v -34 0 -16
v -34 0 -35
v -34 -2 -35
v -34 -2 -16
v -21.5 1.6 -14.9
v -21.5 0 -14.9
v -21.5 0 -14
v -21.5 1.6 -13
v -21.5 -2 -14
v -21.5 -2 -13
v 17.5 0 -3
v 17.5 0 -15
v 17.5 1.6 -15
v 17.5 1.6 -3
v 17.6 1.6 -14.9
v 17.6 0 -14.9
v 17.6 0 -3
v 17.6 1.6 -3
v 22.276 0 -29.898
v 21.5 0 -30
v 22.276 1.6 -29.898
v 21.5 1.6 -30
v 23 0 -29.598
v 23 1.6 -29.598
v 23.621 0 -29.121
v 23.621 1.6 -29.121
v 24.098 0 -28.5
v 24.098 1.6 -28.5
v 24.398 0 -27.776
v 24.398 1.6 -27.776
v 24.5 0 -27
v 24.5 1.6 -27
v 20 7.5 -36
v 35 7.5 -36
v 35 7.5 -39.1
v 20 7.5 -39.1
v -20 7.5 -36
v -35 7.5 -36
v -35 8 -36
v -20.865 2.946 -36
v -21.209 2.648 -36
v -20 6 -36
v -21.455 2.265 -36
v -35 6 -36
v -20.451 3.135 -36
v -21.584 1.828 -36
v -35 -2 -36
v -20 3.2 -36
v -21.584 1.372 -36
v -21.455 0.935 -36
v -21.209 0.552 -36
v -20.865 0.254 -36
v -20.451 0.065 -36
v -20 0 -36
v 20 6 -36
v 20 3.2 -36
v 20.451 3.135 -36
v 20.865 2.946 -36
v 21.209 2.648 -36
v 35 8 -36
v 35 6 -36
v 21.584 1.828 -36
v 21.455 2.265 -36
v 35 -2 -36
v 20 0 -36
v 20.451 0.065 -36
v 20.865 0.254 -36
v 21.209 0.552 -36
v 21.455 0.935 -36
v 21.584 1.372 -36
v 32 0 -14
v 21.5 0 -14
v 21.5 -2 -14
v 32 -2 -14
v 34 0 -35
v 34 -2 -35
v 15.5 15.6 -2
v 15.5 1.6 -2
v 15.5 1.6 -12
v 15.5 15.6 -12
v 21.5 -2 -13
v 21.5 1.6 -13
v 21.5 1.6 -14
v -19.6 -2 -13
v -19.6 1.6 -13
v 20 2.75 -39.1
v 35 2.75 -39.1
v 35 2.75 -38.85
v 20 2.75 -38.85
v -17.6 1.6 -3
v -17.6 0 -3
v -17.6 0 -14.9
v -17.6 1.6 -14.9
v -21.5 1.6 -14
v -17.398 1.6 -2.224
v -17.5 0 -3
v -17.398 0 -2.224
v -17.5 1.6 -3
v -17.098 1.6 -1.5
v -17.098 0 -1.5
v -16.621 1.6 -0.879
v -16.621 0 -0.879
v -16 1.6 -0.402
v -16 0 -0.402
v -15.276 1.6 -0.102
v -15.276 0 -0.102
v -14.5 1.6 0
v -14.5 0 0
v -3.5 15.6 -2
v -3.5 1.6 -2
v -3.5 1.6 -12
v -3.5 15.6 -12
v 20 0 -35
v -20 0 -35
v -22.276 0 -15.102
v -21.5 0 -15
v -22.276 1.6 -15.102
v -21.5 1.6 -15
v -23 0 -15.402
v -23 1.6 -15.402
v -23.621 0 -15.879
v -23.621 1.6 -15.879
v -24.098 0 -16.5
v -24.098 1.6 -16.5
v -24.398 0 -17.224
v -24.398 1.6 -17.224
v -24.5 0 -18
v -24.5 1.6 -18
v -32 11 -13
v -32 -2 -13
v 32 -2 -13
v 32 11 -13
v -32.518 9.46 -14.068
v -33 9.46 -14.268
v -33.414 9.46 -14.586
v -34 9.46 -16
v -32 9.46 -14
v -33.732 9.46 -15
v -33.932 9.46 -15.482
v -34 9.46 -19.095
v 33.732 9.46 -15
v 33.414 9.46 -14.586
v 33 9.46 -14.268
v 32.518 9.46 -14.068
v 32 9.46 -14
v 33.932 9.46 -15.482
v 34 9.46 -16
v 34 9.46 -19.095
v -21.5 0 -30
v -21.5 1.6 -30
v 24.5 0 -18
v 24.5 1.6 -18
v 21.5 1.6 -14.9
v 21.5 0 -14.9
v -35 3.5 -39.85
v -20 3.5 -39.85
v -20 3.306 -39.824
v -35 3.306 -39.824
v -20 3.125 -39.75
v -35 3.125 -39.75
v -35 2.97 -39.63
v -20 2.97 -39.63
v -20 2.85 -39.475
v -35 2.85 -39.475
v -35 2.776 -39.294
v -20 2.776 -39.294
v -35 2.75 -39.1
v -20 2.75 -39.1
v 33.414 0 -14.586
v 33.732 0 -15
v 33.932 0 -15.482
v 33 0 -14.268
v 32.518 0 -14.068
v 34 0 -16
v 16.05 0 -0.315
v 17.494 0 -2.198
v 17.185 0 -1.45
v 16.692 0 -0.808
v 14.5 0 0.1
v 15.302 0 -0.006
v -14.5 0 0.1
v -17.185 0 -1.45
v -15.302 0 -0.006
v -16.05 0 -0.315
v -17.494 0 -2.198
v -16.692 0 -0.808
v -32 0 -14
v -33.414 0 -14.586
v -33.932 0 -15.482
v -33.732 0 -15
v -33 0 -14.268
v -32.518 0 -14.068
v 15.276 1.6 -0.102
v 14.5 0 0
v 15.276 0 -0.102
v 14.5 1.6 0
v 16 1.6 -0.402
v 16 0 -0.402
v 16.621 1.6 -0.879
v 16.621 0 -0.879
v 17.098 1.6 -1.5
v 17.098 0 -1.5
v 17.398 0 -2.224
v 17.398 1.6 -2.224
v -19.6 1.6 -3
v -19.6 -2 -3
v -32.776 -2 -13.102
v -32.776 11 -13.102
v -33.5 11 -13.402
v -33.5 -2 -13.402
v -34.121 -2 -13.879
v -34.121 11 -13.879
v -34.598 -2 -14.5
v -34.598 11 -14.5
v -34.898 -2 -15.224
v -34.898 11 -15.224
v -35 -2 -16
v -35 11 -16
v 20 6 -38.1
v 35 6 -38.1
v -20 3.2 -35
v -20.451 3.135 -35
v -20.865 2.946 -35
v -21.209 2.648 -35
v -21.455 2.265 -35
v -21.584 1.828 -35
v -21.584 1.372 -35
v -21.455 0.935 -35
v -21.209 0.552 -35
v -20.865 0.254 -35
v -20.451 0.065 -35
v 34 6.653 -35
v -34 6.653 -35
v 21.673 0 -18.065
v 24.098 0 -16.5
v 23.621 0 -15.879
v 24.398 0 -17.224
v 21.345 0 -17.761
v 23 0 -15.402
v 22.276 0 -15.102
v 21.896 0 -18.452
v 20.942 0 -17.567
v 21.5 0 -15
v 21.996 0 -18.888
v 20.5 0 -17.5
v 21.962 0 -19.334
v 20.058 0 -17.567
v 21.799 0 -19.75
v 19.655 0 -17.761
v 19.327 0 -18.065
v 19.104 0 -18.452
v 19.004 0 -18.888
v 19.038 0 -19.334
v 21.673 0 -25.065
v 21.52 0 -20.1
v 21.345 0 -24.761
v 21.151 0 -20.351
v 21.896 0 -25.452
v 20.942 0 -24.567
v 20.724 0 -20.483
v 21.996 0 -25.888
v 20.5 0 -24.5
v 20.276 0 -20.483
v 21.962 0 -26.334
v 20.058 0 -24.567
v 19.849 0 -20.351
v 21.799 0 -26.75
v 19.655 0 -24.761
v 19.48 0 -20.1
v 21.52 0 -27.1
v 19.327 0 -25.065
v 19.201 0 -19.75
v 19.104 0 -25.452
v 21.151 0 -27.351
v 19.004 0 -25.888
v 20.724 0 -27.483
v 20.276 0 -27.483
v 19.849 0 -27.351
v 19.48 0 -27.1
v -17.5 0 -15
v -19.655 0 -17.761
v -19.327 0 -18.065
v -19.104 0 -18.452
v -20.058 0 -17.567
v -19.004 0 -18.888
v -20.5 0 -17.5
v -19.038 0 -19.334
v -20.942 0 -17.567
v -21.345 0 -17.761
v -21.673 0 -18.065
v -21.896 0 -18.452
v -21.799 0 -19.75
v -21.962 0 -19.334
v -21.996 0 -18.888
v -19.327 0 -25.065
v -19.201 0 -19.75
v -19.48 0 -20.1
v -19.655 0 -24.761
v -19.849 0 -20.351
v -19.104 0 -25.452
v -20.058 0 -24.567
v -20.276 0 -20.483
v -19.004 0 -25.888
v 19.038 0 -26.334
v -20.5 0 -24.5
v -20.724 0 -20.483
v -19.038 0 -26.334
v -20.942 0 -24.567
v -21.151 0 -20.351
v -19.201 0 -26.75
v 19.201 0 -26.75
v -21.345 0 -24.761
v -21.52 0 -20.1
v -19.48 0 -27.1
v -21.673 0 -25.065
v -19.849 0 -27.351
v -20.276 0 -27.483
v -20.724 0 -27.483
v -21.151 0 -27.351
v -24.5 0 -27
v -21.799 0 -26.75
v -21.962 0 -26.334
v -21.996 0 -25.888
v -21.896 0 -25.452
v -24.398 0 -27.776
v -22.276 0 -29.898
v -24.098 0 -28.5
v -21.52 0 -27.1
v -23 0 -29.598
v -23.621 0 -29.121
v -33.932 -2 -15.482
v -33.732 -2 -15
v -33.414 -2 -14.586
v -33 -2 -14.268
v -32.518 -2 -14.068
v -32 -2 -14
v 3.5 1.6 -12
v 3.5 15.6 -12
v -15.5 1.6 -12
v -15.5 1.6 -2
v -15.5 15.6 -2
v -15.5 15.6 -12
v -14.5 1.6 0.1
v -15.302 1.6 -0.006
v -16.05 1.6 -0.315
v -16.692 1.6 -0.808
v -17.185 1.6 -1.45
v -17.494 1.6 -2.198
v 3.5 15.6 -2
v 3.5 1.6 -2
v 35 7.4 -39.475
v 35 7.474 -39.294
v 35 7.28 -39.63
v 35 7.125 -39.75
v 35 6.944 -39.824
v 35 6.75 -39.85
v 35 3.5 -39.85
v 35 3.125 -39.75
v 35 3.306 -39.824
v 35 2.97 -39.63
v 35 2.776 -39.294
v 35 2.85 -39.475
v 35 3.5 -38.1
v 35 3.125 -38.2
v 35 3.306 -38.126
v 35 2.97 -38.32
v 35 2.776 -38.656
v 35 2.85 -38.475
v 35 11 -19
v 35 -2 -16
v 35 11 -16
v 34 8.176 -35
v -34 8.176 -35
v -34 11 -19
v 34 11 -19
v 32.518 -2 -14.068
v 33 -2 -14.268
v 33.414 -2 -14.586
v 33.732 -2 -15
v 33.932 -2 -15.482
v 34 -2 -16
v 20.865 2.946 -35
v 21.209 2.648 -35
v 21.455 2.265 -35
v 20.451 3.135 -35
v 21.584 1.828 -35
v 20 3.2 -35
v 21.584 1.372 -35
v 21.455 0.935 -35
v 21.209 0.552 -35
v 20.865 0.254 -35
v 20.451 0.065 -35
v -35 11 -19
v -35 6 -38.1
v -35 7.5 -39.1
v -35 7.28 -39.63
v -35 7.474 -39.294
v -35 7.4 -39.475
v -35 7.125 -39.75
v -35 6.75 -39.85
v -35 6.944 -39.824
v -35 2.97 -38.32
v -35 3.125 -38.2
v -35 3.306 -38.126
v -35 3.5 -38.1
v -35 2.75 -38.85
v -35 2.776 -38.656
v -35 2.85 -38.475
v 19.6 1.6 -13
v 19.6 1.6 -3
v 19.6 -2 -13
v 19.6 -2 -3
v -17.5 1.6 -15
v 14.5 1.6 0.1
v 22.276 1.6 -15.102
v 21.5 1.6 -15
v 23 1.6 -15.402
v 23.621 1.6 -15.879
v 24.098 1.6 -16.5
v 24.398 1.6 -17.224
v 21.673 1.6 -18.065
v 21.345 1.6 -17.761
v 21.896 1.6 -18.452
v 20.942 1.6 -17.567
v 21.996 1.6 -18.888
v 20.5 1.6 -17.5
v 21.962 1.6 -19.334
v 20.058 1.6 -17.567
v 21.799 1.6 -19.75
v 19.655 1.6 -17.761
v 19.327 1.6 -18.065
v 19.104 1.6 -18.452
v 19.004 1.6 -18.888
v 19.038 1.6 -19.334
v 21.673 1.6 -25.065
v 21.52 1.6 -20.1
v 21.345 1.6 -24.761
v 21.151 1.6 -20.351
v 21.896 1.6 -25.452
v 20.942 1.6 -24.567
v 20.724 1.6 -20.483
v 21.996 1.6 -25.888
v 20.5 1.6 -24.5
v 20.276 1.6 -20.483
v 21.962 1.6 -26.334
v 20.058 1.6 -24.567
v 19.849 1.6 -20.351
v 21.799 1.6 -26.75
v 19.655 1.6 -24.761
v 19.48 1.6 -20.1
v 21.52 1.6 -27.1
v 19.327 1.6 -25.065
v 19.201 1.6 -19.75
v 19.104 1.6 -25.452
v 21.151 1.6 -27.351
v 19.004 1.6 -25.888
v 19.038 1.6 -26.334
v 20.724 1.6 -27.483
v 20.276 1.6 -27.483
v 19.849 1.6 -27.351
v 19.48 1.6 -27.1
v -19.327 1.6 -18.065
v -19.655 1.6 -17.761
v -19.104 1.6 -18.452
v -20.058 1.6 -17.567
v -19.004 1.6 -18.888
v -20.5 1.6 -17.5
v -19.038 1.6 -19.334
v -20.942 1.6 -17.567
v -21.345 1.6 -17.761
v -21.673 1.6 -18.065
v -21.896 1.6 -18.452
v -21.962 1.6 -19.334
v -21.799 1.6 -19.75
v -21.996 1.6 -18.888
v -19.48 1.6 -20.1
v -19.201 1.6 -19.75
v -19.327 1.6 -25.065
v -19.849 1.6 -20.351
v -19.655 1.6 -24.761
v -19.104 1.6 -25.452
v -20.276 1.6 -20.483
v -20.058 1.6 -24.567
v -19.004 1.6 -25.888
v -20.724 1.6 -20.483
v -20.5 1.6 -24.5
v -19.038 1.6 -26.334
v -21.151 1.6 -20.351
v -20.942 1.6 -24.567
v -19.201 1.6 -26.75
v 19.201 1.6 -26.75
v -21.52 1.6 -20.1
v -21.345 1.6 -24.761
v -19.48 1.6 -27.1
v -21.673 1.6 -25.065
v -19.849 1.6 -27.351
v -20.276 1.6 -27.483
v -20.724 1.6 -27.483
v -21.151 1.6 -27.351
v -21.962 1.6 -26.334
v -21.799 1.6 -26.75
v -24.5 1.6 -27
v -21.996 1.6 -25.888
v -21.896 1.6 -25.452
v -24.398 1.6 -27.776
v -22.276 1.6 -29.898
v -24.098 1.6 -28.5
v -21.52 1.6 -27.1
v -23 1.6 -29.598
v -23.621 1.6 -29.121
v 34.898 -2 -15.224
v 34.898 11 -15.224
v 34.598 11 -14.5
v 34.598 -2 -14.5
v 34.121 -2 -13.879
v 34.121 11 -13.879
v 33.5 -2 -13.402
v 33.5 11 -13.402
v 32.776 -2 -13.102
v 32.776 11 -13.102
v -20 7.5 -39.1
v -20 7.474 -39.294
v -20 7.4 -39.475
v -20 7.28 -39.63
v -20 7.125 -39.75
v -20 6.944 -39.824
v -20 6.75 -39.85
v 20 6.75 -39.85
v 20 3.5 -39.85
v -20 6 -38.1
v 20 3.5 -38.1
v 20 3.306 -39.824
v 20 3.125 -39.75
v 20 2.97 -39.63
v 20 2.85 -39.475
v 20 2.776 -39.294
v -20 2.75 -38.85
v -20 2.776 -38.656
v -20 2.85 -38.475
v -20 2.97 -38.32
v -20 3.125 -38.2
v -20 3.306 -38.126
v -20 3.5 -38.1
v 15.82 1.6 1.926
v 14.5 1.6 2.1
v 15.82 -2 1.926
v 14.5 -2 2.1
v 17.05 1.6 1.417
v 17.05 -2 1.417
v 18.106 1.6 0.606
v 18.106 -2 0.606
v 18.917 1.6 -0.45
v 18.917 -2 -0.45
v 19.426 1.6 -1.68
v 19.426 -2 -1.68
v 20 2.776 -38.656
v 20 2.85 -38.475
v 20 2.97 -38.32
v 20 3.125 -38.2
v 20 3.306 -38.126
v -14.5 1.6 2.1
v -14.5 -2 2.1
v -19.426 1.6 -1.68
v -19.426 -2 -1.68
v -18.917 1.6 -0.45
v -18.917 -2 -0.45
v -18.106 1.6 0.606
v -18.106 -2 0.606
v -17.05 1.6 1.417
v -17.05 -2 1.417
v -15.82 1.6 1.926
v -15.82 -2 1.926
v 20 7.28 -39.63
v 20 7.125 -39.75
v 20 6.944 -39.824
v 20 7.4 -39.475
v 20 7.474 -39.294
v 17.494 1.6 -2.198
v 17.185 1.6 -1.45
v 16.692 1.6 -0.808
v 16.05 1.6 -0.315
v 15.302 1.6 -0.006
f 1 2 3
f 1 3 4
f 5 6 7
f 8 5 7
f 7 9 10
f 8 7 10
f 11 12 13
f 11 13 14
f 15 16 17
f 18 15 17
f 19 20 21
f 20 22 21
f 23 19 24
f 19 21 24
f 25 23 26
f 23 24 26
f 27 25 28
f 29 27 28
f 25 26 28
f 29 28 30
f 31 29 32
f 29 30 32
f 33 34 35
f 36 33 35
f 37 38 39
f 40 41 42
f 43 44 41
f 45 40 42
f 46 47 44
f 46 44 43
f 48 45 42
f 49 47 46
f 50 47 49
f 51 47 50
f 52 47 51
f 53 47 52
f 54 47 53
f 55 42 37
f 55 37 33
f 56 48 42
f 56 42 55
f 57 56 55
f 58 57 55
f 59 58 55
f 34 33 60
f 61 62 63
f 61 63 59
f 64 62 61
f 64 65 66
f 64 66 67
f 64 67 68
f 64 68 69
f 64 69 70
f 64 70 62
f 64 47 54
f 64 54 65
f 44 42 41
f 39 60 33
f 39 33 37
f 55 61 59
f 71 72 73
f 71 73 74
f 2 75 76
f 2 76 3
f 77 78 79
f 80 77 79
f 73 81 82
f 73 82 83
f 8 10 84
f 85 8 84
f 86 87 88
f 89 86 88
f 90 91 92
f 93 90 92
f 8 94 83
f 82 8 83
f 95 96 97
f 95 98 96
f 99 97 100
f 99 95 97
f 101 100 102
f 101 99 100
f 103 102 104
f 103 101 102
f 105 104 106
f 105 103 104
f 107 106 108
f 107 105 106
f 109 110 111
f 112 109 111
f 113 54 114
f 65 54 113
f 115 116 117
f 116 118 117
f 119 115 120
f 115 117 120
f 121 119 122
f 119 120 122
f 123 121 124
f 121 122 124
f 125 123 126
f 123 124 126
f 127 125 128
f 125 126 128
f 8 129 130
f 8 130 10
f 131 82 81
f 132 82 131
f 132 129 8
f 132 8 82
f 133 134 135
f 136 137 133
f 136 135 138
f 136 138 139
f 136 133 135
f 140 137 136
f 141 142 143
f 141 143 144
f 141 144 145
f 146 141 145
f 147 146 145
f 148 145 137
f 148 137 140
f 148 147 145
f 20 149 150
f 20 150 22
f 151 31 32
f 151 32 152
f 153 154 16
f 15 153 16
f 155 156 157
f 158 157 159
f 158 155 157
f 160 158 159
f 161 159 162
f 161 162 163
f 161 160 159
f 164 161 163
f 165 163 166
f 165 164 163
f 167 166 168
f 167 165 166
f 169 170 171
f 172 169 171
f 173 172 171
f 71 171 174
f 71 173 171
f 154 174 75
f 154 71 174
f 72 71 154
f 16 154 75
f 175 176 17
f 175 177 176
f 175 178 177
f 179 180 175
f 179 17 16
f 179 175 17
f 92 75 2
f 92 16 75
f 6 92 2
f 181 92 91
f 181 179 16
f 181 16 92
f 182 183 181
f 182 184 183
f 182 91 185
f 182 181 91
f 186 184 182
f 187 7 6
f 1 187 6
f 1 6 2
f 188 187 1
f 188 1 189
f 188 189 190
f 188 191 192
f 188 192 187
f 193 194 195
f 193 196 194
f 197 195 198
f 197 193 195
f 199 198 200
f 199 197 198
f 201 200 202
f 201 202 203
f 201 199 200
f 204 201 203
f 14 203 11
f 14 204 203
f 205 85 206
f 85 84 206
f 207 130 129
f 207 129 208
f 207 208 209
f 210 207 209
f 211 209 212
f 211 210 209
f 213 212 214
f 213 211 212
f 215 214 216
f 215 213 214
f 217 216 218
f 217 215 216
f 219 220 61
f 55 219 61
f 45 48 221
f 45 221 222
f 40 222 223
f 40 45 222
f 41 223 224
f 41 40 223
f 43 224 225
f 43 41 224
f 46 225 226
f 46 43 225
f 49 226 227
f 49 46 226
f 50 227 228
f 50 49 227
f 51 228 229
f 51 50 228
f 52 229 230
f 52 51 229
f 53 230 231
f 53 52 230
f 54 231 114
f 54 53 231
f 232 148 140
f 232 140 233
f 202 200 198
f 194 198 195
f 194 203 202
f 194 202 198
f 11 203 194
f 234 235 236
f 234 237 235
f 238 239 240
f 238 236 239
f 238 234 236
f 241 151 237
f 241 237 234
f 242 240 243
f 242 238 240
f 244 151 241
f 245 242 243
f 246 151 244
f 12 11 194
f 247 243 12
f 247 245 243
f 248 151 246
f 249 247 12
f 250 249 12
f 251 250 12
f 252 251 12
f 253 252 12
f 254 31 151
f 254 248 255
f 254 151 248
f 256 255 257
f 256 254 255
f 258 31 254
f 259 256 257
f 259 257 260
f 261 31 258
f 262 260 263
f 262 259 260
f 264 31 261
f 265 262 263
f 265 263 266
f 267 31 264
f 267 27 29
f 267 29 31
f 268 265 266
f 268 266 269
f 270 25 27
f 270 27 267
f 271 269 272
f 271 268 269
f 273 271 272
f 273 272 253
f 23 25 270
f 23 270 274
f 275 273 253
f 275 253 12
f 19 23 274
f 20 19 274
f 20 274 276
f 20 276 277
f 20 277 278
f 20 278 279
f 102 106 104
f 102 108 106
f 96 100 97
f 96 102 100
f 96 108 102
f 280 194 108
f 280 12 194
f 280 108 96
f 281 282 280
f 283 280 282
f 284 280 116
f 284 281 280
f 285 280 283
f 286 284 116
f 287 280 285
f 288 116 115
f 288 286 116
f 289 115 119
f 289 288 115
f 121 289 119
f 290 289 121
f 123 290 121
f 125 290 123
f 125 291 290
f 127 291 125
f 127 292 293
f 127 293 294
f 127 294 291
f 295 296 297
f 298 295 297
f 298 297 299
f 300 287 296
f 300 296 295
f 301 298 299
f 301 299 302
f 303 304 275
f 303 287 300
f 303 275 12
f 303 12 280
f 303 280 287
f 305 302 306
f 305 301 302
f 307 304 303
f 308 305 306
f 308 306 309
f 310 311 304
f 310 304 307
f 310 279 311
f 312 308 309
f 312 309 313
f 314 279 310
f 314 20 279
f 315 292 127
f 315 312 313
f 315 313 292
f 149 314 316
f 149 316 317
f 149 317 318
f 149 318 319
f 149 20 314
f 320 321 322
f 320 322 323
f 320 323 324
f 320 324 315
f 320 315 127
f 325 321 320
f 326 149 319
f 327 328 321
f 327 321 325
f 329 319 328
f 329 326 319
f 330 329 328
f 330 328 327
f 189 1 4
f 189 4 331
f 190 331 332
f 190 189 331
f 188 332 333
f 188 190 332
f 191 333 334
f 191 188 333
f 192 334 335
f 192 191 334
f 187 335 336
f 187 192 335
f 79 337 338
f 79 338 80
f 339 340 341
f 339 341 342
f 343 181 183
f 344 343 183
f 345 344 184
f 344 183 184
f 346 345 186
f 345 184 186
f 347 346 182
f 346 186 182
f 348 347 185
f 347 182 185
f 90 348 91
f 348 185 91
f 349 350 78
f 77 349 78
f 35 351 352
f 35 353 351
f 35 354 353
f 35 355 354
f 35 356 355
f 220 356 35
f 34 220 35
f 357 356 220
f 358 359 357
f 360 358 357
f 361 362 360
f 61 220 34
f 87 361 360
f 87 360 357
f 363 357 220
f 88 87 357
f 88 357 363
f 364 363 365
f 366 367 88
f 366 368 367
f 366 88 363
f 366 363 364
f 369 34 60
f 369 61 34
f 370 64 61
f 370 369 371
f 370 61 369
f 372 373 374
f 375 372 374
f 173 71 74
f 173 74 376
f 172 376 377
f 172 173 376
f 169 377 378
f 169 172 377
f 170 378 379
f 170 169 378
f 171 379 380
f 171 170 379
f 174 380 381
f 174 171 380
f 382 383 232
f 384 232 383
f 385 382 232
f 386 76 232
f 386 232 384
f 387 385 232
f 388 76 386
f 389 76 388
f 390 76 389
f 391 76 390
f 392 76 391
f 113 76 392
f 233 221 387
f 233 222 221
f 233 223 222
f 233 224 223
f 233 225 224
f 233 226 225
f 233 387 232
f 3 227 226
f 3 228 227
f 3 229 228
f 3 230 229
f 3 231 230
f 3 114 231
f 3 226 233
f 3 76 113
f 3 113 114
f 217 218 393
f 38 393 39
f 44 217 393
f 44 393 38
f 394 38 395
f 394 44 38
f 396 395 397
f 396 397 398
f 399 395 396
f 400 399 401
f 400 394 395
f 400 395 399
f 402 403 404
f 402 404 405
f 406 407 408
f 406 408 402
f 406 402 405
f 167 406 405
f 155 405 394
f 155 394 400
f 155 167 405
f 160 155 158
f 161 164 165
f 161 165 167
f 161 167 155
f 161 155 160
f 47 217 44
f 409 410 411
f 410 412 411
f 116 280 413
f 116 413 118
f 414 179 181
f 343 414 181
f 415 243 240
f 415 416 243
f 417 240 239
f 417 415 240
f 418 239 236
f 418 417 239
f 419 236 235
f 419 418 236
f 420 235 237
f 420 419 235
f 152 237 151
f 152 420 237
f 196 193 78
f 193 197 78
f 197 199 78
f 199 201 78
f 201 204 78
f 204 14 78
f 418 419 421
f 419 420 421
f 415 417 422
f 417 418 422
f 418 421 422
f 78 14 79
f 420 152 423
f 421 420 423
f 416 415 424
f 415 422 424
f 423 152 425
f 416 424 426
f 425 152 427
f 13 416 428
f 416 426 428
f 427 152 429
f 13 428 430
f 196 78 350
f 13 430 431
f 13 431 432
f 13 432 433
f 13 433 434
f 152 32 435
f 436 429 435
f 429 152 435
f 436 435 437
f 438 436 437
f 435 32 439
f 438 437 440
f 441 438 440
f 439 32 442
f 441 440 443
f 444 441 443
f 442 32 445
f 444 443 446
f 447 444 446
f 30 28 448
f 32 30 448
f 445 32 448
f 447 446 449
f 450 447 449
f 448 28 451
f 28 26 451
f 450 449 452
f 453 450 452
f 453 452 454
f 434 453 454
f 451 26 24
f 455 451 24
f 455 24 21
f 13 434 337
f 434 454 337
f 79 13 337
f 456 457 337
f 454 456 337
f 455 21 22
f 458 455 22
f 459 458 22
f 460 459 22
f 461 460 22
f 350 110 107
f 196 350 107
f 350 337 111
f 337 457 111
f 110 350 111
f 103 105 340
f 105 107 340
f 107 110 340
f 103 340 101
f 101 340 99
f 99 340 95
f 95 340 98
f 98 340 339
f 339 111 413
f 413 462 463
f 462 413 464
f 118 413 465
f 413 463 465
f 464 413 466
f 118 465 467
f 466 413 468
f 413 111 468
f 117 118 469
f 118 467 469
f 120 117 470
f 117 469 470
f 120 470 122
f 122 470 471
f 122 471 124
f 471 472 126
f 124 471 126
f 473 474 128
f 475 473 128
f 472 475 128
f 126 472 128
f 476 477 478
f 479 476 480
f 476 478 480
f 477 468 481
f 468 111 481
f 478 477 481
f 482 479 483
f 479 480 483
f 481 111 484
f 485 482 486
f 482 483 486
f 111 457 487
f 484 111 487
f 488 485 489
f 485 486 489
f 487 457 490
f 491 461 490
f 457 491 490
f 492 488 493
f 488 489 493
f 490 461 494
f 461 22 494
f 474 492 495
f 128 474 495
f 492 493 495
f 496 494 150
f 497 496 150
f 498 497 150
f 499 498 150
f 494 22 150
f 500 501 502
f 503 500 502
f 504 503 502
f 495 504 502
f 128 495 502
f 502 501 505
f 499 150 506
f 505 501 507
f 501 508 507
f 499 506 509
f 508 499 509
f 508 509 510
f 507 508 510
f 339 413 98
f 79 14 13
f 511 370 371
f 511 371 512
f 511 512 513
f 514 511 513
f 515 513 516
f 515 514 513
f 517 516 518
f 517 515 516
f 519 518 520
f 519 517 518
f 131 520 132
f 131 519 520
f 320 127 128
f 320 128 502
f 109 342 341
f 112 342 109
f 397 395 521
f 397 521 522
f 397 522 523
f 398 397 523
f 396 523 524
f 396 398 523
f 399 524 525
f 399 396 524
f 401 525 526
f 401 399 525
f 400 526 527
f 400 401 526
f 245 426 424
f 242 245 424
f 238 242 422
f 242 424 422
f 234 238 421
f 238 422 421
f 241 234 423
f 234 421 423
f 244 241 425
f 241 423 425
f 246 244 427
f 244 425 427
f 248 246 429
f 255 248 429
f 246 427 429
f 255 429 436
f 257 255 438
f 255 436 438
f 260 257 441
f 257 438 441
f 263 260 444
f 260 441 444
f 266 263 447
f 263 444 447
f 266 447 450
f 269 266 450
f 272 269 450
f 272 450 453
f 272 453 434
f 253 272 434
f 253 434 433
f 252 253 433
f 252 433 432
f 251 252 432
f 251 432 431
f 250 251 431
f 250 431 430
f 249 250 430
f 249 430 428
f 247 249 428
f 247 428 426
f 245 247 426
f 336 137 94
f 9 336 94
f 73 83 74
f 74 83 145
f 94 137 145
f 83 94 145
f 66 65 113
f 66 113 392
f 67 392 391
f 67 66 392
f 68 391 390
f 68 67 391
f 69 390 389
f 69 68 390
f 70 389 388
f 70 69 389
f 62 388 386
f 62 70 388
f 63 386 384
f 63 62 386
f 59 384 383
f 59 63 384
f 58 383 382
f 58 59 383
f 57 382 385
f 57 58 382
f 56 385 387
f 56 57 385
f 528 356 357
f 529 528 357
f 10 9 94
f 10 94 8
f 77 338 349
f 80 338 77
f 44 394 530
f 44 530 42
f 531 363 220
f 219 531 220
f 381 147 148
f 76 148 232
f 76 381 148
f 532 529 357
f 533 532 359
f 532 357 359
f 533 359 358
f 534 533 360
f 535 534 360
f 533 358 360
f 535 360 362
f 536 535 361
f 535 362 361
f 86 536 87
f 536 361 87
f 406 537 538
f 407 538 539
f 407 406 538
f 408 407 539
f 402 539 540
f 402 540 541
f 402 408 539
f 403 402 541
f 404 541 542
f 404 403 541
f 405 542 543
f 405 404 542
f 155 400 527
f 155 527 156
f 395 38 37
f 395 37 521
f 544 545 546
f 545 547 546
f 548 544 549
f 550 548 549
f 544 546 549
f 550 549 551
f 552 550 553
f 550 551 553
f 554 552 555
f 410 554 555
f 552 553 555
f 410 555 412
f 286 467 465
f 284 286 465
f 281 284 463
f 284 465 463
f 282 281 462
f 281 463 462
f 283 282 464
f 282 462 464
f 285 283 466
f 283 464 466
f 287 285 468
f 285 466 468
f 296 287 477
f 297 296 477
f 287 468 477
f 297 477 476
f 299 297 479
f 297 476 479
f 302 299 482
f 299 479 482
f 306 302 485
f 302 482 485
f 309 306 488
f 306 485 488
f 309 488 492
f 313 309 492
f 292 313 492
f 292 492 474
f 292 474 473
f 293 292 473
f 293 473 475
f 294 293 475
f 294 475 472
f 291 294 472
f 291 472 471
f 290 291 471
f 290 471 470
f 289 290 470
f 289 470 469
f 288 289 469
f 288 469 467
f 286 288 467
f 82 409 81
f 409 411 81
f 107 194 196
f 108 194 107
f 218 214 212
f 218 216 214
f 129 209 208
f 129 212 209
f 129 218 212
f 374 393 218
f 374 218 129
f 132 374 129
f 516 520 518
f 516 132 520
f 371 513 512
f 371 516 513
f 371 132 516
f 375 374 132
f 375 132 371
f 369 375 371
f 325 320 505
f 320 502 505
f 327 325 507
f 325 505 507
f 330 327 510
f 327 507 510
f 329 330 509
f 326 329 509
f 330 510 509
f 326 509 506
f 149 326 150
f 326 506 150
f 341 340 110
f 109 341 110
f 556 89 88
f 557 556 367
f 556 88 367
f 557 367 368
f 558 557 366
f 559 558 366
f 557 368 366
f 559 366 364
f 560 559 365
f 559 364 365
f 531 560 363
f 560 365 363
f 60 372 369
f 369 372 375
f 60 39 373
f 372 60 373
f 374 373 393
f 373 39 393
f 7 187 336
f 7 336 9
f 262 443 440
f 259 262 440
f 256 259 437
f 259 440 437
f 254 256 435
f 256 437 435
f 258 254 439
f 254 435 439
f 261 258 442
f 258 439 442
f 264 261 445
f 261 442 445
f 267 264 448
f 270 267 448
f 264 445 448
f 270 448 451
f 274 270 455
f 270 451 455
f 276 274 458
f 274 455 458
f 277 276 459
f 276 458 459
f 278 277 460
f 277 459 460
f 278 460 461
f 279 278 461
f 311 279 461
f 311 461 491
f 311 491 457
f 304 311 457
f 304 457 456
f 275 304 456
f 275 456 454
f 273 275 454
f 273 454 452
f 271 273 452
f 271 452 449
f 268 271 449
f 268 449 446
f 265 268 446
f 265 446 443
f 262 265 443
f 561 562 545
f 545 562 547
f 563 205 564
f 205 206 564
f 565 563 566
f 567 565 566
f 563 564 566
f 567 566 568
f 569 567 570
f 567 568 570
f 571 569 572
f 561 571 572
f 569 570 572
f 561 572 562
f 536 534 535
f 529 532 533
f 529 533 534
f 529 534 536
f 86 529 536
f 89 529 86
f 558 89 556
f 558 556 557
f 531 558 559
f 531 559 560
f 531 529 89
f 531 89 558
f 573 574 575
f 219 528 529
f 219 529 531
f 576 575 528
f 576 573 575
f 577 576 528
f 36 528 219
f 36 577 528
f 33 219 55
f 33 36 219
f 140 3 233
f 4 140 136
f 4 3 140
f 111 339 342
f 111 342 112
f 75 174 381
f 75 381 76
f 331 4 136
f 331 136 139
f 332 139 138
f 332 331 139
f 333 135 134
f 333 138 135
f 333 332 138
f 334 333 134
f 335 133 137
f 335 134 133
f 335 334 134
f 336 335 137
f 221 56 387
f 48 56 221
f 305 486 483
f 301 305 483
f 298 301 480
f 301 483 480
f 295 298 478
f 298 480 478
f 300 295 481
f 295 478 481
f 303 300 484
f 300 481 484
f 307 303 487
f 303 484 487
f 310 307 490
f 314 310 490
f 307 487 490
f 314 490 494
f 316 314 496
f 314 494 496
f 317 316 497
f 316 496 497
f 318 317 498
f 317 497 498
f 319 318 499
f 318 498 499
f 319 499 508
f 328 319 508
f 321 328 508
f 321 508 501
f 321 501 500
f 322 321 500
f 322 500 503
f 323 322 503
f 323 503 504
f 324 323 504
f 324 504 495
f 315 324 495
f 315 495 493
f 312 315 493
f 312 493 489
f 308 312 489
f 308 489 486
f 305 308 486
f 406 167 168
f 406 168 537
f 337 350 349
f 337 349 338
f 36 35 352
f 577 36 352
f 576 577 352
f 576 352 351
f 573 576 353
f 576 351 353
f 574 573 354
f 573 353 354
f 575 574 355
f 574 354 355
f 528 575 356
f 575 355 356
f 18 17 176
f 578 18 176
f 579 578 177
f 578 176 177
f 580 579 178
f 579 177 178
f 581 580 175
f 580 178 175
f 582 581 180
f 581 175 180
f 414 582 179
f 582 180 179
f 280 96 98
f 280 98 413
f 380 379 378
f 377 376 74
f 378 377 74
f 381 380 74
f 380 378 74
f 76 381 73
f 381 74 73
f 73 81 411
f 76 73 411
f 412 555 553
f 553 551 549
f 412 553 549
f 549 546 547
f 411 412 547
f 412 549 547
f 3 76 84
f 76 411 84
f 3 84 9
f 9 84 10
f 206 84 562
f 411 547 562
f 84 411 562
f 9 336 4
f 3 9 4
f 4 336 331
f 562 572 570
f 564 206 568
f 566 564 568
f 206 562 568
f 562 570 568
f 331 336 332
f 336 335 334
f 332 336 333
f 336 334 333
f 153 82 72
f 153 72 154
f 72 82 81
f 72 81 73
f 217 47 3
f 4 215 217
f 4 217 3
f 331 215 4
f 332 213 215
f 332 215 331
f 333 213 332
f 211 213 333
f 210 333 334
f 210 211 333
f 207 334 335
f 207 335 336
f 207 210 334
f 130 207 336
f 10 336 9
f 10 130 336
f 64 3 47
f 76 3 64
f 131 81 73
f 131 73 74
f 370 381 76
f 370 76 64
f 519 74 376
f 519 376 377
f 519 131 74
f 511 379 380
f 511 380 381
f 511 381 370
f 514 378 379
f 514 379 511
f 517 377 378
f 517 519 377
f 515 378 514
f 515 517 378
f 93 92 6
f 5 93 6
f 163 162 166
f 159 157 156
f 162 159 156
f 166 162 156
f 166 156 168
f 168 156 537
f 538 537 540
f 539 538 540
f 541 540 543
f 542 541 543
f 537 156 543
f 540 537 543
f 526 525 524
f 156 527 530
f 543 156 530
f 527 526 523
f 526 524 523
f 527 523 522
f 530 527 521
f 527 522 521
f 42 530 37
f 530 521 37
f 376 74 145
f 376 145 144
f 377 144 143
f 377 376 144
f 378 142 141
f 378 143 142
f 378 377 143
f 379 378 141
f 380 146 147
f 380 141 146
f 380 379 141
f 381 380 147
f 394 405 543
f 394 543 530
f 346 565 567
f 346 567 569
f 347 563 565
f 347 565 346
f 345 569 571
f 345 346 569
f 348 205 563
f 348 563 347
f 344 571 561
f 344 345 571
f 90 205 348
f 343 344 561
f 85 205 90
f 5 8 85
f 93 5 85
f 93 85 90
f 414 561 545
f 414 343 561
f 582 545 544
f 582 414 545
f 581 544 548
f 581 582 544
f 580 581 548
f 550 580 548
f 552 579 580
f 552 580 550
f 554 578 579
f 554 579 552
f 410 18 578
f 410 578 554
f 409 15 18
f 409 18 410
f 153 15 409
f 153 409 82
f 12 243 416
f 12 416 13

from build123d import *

# Parameters (mm, degrees)
BOSS_EXTRUDE1_DEPTH             = 1.6
SKETCH2_R                       = 1.5
CUT_EXTRUDE1_DEPTH              = 39.766093432
FILLET1_R                       = 3
SKETCH3_W                       = 12
SKETCH3_H                       = 10
BOSS_EXTRUDE2_DEPTH             = 14
BOSS_EXTRUDE3_DEPTH             = 2
BOSS_EXTRUDE4_DEPTH             = 1.6
CUT_EXTRUDE2_DEPTH              = 52.897591466
BOSS_EXTRUDE5_DEPTH             = 15
CUT_EXTRUDE3_DEPTH              = 53.577181362
CUT_EXTRUDE3_DEPTH_BACK         = 53.577181362
BOSS_EXTRUDE6_REACH             = 54.577
BOSS_EXTRUDE6_DIRECTION_2_REACH = 54.577
SKETCH10_W                      = 43
SKETCH10_H                      = 1
BOSS_EXTRUDE7_DEPTH             = 9.4
CUT_EXTRUDE4_DEPTH              = 1
BOSS_EXTRUDE8_DEPTH             = 15


with BuildPart() as part:
    # Sketch1 → Boss-Extrude1 (new body)
    with BuildSketch(Plane(origin=(0, 0, 0), x_dir=(1, 0, 0), z_dir=(0, 1, 0))):
        Polygon((-17.5, 0), (-17.5, 15), (-24.5, 15), (-24.5, 30), (24.5, 30), (24.5, 15), (17.5, 15), (17.5, 0), align=None)
    extrude(amount=BOSS_EXTRUDE1_DEPTH)

    # Sketch2 → Cut-Extrude1 (cut, through all)
    with BuildSketch(Plane(origin=(0, 1.6, 0), x_dir=(1, 0, 0), z_dir=(0, 1, 0))):
        with Locations(Location((-20.5, 26, 0), (0, 0, 270))):
            Circle(SKETCH2_R)
        with Locations(Location((-20.5, 19, 0), (0, 0, 270))):
            Circle(SKETCH2_R)
        with Locations(Location((20.5, 26, 0), (0, 0, 270))):
            Circle(SKETCH2_R)
        with Locations(Location((20.5, 19, 0), (0, 0, 270))):
            Circle(SKETCH2_R)
    extrude(amount=-CUT_EXTRUDE1_DEPTH, mode=Mode.SUBTRACT)

    # Fillet1
    fillet1_edges = [part.edges().sort_by_distance(p)[0] for p in [
        (-17.5, 0.8, 0),
        (-24.5, 0.8, -15),
        (-24.5, 0.8, -30),
        (24.5, 0.8, -30),
        (24.5, 0.8, -15),
        (17.5, 0.8, 0),
    ]]
    fillet(fillet1_edges, radius=FILLET1_R)

    # Sketch3 → Boss-Extrude2 (add)
    with BuildSketch(Plane(origin=(0, 1.6, 0), x_dir=(1, 0, 0), z_dir=(0, 1, 0))):
        with Locations((-9.5, 7)):
            Rectangle(SKETCH3_W, SKETCH3_H)
        with Locations((9.5, 7)):
            Rectangle(SKETCH3_W, SKETCH3_H)
    extrude(amount=BOSS_EXTRUDE2_DEPTH)


with BuildPart() as body_2:
    # Sketch4 → Boss-Extrude3 (new body)
    with BuildSketch(Plane.XZ):
        with BuildLine():
            Line((-32, -13), (-19.6, -13))
            Line((-19.6, -13), (-19.6, -3))
            ThreePointArc((-19.6, -3), (-18.106244584, 0.606244584), (-14.5, 2.1))
            Line((-14.5, 2.1), (14.5, 2.1))
            ThreePointArc((14.5, 2.1), (18.106244584, 0.606244584), (19.6, -3))
            Line((19.6, -3), (19.6, -13))
            Line((19.6, -13), (32, -13))
            ThreePointArc((32, -13), (34.121320344, -13.878679656), (35, -16))
            Line((35, -16), (35, -35))
            Line((35, -35), (-35, -35))
            Line((-35, -35), (-35, -16))
            ThreePointArc((-35, -16), (-34.121320344, -13.878679656), (-32, -13))
        make_face()
    extrude(amount=BOSS_EXTRUDE3_DEPTH)

    # Sketch6 → Cut-Extrude2 (cut, through all)
    with BuildSketch(Plane(origin=(0, 0, 0), x_dir=(1, 0, 0), z_dir=(0, 1, 0))):
        with BuildLine():
            Line((-35, 16), (-35, 35))
            Line((-35, 35), (-34, 35))
            Line((-34, 35), (-34, 16))
            ThreePointArc((-34, 16), (-33.414213562, 14.585786438), (-32, 14))
            Line((-32, 14), (-21.5, 14))
            Line((-21.5, 14), (-21.5, 13))
            Line((-21.5, 13), (-32, 13))
            ThreePointArc((-32, 13), (-34.121320344, 13.878679656), (-35, 16))
        make_face()
        with BuildLine():
            Line((32, 13), (21.5, 13))
            Line((21.5, 13), (21.5, 14))
            Line((21.5, 14), (32, 14))
            ThreePointArc((32, 14), (33.414213562, 14.585786438), (34, 16))
            Line((34, 16), (34, 35))
            Line((34, 35), (35, 35))
            Line((35, 35), (35, 16))
            ThreePointArc((35, 16), (34.121320344, 13.878679656), (32, 13))
        make_face()
    extrude(amount=-CUT_EXTRUDE2_DEPTH, mode=Mode.SUBTRACT)


with BuildPart() as body_3:
    # Sketch5 → Boss-Extrude4 (new body)
    with BuildSketch(Plane(origin=(0, 0, 0), x_dir=(1, 0, 0), z_dir=(0, 1, 0))):
        with BuildLine():
            Line((-21.5, 13), (-19.6, 13))
            Line((-19.6, 13), (-19.6, 3))
            ThreePointArc((-19.6, 3), (-18.106244584, -0.606244584), (-14.5, -2.1))
            Line((-14.5, -2.1), (14.5, -2.1))
            ThreePointArc((14.5, -2.1), (18.106244584, -0.606244584), (19.6, 3))
            Line((19.6, 3), (19.6, 13))
            Line((19.6, 13), (21.5, 13))
            Line((21.5, 13), (21.5, 14.9))
            Line((21.5, 14.9), (17.6, 14.9))
            Line((17.6, 14.9), (17.6, 3))
            ThreePointArc((17.6, 3), (16.692031022, 0.807968978), (14.5, -0.1))
            Line((14.5, -0.1), (-14.5, -0.1))
            ThreePointArc((-14.5, -0.1), (-16.692031022, 0.807968978), (-17.6, 3))
            Line((-17.6, 3), (-17.6, 14.9))
            Line((-17.6, 14.9), (-21.5, 14.9))
            Line((-21.5, 14.9), (-21.5, 13))
        make_face()
    extrude(amount=BOSS_EXTRUDE4_DEPTH)


with BuildPart() as body_4:
    # Sketch7 → Boss-Extrude5 (new body)
    with BuildSketch(Plane.XZ.offset(2)):
        with BuildLine():
            Line((-21.5, -13), (-32, -13))
            ThreePointArc((-32, -13), (-34.121320344, -13.878679656), (-35, -16))
            Line((-35, -16), (-35, -36))
            Line((-35, -36), (35, -36))
            Line((35, -36), (35, -16))
            ThreePointArc((35, -16), (34.121320344, -13.878679656), (32, -13))
            Line((32, -13), (21.5, -13))
            Line((21.5, -13), (21.5, -14))
            Line((21.5, -14), (32, -14))
            ThreePointArc((32, -14), (33.414213562, -14.585786438), (34, -16))
            Line((34, -16), (34, -35))
            Line((34, -35), (-34, -35))
            Line((-34, -35), (-34, -16))
            ThreePointArc((-34, -16), (-33.414213562, -14.585786438), (-32, -14))
            Line((-32, -14), (-21.5, -14))
            Line((-21.5, -14), (-21.5, -13))
        make_face()
    extrude(amount=-BOSS_EXTRUDE5_DEPTH)

    # Sketch8 → Cut-Extrude3 (cut, two sides: drawn at the far end of the back side and taken through both)
    with BuildSketch(Plane(origin=(0, 0, 0), x_dir=(0, 0, -1), z_dir=(1, 0, 0)).offset(-CUT_EXTRUDE3_DEPTH_BACK)):
        Polygon((36, 8), (19, 11), (13, 11), (13, 13), (36, 13), align=None)
    extrude(amount=CUT_EXTRUDE3_DEPTH + CUT_EXTRUDE3_DEPTH_BACK, mode=Mode.SUBTRACT)

    # Sketch9 → Boss-Extrude6 (add, up to next)
    with BuildSketch(Plane(origin=(0, 0, 0), x_dir=(0, 0, -1), z_dir=(1, 0, 0)), mode=Mode.PRIVATE) as boss_extrude6_sk1:
        Polygon((35, 8.176470588), (19, 11), (14, 11), (14, 9.46), (19.095328416, 9.46), (35, 6.65329325), align=None)
    boss_extrude6_tool1 = extrude(boss_extrude6_sk1.sketch, amount=BOSS_EXTRUDE6_REACH, mode=Mode.PRIVATE) - body_4.part
    add(boss_extrude6_tool1.solids().sort_by_distance((0, 9.16359, -24.478882))[0])

    # Sketch9 → Boss-Extrude6 direction 2 (add, up to next)
    with BuildSketch(Plane(origin=(0, 0, 0), x_dir=(0, 0, -1), z_dir=(1, 0, 0)), mode=Mode.PRIVATE) as boss_extrude6_direction_2_sk1:
        Polygon((35, 8.176470588), (19, 11), (14, 11), (14, 9.46), (19.095328416, 9.46), (35, 6.65329325), align=None)
    boss_extrude6_direction_2_tool1 = extrude(boss_extrude6_direction_2_sk1.sketch, amount=-BOSS_EXTRUDE6_DIRECTION_2_REACH, mode=Mode.PRIVATE) - body_4.part
    add(boss_extrude6_direction_2_tool1.solids().sort_by_distance((0, 9.16359, -24.478882))[0])

    # Sketch11 → Cut-Extrude4 (cut)
    with BuildSketch(Plane(origin=(0, 0, -36), x_dir=(-1, 0, 0), z_dir=(0, 0, -1))):
        with BuildLine():
            Line((-20, 3.2), (20, 3.2))
            ThreePointArc((20, 3.2), (21.6, 1.6), (20, 0))
            Line((20, 0), (-20, 0))
            ThreePointArc((-20, 0), (-21.6, 1.6), (-20, 3.2))
        make_face()
    extrude(amount=-CUT_EXTRUDE4_DEPTH, mode=Mode.SUBTRACT)

    # Sketch12 → Boss-Extrude8 (add)
    with BuildSketch(Plane.ZY.offset(35)):
        with BuildLine():
            Line((-36, 7.5), (-39.1, 7.5))
            ThreePointArc((-39.1, 7.5), (-39.630330086, 7.280330086), (-39.85, 6.75))
            Line((-39.85, 6.75), (-39.85, 3.5))
            ThreePointArc((-39.85, 3.5), (-39.630330086, 2.969669914), (-39.1, 2.75))
            Line((-39.1, 2.75), (-38.85, 2.75))
            ThreePointArc((-38.85, 2.75), (-38.319669914, 2.969669914), (-38.1, 3.5))
            Line((-38.1, 3.5), (-38.1, 6))
            Line((-38.1, 6), (-36, 6))
            Line((-36, 6), (-36, 7.5))
        make_face()
    boss_extrude8 = extrude(amount=-BOSS_EXTRUDE8_DEPTH)

    # Mirror1: Boss-Extrude8 across plane
    add(boss_extrude8.mirror(Plane(origin=(0, 0, 0), x_dir=(0, 0, 1), z_dir=(1, 0, 0))))


with BuildPart() as body_5:
    # Sketch10 → Boss-Extrude7 (new body)
    with BuildSketch(Plane(origin=(0, 11, 0), x_dir=(1, 0, 0), z_dir=(0, 1, 0))):
        with Locations((0, 13.5)):
            Rectangle(SKETCH10_W, SKETCH10_H)
    extrude(amount=-BOSS_EXTRUDE7_DEPTH)


with BuildPart() as body_4_1:
    add(body_4.part)

    # Combine1: union body 5
    add(body_5.part)


with BuildPart() as body_2_1:
    add(body_2.part)

    # Combine2: union body 3
    add(body_3.part)


solid = Compound([part.part, body_4_1.part, body_2_1.part])
